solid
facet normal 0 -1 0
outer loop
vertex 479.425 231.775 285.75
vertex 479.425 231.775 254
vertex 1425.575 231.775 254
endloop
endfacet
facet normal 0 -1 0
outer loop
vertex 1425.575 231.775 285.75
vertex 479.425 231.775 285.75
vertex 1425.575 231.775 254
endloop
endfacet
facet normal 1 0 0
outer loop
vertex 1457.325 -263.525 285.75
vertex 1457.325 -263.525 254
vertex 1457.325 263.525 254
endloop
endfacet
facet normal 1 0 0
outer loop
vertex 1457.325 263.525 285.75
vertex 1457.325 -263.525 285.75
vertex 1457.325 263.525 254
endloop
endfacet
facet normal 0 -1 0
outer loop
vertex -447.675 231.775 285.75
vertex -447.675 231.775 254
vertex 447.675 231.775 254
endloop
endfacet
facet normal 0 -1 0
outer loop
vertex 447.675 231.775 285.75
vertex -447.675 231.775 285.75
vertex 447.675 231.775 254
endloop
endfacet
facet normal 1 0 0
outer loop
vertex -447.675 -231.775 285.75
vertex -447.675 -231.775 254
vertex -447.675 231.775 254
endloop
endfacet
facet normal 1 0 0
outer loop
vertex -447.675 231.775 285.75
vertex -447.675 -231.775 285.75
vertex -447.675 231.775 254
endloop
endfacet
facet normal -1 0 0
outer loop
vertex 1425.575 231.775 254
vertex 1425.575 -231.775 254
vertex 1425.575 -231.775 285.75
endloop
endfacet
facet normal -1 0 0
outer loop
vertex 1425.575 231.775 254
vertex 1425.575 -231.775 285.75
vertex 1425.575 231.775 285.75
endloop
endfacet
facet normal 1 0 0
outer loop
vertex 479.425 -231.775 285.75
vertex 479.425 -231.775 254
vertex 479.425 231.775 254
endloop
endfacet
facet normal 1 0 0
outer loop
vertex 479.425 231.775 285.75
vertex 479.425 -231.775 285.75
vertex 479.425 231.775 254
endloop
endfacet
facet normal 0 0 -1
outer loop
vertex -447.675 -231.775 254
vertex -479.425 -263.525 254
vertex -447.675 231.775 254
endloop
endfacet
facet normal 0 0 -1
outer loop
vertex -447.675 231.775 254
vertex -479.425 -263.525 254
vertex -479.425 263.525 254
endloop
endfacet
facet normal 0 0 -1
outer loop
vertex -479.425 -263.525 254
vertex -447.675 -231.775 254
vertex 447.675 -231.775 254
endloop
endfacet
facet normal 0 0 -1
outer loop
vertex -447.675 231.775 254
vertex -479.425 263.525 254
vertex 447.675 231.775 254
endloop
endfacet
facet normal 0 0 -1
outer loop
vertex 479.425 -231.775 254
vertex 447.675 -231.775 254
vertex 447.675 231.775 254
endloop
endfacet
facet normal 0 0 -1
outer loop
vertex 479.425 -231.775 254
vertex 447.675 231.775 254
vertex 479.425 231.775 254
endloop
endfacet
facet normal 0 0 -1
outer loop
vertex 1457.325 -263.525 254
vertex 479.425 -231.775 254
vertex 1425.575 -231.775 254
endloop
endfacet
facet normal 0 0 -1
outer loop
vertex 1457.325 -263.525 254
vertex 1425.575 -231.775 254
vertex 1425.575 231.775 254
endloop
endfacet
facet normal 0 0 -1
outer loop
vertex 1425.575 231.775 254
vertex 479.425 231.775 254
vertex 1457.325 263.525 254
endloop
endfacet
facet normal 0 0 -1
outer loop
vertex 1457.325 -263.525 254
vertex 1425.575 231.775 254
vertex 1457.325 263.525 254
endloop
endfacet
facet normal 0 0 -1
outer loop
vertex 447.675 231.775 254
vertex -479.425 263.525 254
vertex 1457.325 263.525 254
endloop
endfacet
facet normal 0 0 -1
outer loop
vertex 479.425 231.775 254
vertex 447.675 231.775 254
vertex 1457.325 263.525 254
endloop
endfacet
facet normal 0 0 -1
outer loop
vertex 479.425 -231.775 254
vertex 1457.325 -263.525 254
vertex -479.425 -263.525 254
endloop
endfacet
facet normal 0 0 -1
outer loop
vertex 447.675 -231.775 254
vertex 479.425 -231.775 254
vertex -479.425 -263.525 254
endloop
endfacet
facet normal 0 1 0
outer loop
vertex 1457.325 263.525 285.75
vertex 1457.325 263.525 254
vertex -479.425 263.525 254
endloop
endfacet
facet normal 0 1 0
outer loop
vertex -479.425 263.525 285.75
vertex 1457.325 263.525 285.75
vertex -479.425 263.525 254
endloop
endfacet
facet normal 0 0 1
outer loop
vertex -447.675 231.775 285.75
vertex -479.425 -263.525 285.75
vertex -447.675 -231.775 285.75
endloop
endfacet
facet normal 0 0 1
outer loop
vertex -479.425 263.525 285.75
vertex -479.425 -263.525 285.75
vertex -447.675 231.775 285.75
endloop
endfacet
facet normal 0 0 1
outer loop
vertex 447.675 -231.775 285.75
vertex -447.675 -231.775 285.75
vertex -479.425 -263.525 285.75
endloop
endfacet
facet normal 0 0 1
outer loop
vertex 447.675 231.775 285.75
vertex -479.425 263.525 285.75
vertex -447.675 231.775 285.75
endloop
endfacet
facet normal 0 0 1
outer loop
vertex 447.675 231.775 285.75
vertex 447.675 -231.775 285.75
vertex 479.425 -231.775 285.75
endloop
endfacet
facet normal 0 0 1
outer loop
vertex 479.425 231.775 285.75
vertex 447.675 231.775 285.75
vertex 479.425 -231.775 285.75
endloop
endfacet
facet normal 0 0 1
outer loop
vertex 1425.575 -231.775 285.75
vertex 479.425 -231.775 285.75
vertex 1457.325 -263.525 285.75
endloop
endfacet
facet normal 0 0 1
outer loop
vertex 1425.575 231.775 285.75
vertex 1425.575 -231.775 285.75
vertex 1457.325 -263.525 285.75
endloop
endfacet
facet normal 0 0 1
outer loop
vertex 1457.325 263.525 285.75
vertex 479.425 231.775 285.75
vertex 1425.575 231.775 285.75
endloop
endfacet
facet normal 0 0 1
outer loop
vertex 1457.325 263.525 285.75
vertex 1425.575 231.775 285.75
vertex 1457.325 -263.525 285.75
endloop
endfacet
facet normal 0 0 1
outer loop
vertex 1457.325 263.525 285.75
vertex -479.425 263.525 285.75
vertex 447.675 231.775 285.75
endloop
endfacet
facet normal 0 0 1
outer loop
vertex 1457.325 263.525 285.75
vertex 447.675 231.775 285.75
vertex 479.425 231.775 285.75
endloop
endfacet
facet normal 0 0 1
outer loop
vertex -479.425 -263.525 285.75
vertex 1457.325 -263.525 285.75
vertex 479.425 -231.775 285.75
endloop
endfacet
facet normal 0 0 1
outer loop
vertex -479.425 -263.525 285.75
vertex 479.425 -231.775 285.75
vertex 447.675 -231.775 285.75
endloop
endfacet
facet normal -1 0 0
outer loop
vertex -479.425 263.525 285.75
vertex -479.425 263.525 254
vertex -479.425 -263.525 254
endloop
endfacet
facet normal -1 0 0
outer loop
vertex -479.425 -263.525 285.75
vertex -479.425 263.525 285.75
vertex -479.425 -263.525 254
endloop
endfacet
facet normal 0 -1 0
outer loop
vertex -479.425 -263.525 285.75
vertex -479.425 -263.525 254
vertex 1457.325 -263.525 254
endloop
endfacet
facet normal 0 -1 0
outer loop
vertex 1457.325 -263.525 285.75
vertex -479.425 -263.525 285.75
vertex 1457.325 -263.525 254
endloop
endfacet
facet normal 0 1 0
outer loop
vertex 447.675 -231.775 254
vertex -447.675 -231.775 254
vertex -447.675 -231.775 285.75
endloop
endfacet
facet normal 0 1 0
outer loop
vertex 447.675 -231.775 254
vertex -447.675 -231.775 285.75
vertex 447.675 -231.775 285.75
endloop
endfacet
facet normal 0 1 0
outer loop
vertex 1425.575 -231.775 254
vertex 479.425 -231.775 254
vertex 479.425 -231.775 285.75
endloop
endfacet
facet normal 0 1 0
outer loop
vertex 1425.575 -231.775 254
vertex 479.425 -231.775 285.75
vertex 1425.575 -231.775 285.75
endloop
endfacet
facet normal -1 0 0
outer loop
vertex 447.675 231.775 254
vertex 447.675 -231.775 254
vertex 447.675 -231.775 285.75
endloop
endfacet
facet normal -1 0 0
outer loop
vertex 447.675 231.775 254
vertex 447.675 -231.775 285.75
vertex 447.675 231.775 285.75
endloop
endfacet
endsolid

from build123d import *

# Parameters (mm, degrees)
F1_W     = 895.35
F1_H     = 463.55
F1_W_2   = 946.15
F2_DEPTH = 31.75


with BuildPart() as f2:
    # F1 (on offset) → F2 (new body)
    with BuildSketch(Plane.XY.offset(254)):
        Polygon((1457.325, 263.525), (479.425, 263.525), (-479.425, 263.525), (-479.425, -263.525), (479.425, -263.525), (1457.325, -263.525), align=None)
        Rectangle(F1_W, F1_H, mode=Mode.SUBTRACT)
        with Locations((952.5, 0)):
            Rectangle(F1_W_2, F1_H, mode=Mode.SUBTRACT)
    extrude(amount=F2_DEPTH)


solid = f2.part
